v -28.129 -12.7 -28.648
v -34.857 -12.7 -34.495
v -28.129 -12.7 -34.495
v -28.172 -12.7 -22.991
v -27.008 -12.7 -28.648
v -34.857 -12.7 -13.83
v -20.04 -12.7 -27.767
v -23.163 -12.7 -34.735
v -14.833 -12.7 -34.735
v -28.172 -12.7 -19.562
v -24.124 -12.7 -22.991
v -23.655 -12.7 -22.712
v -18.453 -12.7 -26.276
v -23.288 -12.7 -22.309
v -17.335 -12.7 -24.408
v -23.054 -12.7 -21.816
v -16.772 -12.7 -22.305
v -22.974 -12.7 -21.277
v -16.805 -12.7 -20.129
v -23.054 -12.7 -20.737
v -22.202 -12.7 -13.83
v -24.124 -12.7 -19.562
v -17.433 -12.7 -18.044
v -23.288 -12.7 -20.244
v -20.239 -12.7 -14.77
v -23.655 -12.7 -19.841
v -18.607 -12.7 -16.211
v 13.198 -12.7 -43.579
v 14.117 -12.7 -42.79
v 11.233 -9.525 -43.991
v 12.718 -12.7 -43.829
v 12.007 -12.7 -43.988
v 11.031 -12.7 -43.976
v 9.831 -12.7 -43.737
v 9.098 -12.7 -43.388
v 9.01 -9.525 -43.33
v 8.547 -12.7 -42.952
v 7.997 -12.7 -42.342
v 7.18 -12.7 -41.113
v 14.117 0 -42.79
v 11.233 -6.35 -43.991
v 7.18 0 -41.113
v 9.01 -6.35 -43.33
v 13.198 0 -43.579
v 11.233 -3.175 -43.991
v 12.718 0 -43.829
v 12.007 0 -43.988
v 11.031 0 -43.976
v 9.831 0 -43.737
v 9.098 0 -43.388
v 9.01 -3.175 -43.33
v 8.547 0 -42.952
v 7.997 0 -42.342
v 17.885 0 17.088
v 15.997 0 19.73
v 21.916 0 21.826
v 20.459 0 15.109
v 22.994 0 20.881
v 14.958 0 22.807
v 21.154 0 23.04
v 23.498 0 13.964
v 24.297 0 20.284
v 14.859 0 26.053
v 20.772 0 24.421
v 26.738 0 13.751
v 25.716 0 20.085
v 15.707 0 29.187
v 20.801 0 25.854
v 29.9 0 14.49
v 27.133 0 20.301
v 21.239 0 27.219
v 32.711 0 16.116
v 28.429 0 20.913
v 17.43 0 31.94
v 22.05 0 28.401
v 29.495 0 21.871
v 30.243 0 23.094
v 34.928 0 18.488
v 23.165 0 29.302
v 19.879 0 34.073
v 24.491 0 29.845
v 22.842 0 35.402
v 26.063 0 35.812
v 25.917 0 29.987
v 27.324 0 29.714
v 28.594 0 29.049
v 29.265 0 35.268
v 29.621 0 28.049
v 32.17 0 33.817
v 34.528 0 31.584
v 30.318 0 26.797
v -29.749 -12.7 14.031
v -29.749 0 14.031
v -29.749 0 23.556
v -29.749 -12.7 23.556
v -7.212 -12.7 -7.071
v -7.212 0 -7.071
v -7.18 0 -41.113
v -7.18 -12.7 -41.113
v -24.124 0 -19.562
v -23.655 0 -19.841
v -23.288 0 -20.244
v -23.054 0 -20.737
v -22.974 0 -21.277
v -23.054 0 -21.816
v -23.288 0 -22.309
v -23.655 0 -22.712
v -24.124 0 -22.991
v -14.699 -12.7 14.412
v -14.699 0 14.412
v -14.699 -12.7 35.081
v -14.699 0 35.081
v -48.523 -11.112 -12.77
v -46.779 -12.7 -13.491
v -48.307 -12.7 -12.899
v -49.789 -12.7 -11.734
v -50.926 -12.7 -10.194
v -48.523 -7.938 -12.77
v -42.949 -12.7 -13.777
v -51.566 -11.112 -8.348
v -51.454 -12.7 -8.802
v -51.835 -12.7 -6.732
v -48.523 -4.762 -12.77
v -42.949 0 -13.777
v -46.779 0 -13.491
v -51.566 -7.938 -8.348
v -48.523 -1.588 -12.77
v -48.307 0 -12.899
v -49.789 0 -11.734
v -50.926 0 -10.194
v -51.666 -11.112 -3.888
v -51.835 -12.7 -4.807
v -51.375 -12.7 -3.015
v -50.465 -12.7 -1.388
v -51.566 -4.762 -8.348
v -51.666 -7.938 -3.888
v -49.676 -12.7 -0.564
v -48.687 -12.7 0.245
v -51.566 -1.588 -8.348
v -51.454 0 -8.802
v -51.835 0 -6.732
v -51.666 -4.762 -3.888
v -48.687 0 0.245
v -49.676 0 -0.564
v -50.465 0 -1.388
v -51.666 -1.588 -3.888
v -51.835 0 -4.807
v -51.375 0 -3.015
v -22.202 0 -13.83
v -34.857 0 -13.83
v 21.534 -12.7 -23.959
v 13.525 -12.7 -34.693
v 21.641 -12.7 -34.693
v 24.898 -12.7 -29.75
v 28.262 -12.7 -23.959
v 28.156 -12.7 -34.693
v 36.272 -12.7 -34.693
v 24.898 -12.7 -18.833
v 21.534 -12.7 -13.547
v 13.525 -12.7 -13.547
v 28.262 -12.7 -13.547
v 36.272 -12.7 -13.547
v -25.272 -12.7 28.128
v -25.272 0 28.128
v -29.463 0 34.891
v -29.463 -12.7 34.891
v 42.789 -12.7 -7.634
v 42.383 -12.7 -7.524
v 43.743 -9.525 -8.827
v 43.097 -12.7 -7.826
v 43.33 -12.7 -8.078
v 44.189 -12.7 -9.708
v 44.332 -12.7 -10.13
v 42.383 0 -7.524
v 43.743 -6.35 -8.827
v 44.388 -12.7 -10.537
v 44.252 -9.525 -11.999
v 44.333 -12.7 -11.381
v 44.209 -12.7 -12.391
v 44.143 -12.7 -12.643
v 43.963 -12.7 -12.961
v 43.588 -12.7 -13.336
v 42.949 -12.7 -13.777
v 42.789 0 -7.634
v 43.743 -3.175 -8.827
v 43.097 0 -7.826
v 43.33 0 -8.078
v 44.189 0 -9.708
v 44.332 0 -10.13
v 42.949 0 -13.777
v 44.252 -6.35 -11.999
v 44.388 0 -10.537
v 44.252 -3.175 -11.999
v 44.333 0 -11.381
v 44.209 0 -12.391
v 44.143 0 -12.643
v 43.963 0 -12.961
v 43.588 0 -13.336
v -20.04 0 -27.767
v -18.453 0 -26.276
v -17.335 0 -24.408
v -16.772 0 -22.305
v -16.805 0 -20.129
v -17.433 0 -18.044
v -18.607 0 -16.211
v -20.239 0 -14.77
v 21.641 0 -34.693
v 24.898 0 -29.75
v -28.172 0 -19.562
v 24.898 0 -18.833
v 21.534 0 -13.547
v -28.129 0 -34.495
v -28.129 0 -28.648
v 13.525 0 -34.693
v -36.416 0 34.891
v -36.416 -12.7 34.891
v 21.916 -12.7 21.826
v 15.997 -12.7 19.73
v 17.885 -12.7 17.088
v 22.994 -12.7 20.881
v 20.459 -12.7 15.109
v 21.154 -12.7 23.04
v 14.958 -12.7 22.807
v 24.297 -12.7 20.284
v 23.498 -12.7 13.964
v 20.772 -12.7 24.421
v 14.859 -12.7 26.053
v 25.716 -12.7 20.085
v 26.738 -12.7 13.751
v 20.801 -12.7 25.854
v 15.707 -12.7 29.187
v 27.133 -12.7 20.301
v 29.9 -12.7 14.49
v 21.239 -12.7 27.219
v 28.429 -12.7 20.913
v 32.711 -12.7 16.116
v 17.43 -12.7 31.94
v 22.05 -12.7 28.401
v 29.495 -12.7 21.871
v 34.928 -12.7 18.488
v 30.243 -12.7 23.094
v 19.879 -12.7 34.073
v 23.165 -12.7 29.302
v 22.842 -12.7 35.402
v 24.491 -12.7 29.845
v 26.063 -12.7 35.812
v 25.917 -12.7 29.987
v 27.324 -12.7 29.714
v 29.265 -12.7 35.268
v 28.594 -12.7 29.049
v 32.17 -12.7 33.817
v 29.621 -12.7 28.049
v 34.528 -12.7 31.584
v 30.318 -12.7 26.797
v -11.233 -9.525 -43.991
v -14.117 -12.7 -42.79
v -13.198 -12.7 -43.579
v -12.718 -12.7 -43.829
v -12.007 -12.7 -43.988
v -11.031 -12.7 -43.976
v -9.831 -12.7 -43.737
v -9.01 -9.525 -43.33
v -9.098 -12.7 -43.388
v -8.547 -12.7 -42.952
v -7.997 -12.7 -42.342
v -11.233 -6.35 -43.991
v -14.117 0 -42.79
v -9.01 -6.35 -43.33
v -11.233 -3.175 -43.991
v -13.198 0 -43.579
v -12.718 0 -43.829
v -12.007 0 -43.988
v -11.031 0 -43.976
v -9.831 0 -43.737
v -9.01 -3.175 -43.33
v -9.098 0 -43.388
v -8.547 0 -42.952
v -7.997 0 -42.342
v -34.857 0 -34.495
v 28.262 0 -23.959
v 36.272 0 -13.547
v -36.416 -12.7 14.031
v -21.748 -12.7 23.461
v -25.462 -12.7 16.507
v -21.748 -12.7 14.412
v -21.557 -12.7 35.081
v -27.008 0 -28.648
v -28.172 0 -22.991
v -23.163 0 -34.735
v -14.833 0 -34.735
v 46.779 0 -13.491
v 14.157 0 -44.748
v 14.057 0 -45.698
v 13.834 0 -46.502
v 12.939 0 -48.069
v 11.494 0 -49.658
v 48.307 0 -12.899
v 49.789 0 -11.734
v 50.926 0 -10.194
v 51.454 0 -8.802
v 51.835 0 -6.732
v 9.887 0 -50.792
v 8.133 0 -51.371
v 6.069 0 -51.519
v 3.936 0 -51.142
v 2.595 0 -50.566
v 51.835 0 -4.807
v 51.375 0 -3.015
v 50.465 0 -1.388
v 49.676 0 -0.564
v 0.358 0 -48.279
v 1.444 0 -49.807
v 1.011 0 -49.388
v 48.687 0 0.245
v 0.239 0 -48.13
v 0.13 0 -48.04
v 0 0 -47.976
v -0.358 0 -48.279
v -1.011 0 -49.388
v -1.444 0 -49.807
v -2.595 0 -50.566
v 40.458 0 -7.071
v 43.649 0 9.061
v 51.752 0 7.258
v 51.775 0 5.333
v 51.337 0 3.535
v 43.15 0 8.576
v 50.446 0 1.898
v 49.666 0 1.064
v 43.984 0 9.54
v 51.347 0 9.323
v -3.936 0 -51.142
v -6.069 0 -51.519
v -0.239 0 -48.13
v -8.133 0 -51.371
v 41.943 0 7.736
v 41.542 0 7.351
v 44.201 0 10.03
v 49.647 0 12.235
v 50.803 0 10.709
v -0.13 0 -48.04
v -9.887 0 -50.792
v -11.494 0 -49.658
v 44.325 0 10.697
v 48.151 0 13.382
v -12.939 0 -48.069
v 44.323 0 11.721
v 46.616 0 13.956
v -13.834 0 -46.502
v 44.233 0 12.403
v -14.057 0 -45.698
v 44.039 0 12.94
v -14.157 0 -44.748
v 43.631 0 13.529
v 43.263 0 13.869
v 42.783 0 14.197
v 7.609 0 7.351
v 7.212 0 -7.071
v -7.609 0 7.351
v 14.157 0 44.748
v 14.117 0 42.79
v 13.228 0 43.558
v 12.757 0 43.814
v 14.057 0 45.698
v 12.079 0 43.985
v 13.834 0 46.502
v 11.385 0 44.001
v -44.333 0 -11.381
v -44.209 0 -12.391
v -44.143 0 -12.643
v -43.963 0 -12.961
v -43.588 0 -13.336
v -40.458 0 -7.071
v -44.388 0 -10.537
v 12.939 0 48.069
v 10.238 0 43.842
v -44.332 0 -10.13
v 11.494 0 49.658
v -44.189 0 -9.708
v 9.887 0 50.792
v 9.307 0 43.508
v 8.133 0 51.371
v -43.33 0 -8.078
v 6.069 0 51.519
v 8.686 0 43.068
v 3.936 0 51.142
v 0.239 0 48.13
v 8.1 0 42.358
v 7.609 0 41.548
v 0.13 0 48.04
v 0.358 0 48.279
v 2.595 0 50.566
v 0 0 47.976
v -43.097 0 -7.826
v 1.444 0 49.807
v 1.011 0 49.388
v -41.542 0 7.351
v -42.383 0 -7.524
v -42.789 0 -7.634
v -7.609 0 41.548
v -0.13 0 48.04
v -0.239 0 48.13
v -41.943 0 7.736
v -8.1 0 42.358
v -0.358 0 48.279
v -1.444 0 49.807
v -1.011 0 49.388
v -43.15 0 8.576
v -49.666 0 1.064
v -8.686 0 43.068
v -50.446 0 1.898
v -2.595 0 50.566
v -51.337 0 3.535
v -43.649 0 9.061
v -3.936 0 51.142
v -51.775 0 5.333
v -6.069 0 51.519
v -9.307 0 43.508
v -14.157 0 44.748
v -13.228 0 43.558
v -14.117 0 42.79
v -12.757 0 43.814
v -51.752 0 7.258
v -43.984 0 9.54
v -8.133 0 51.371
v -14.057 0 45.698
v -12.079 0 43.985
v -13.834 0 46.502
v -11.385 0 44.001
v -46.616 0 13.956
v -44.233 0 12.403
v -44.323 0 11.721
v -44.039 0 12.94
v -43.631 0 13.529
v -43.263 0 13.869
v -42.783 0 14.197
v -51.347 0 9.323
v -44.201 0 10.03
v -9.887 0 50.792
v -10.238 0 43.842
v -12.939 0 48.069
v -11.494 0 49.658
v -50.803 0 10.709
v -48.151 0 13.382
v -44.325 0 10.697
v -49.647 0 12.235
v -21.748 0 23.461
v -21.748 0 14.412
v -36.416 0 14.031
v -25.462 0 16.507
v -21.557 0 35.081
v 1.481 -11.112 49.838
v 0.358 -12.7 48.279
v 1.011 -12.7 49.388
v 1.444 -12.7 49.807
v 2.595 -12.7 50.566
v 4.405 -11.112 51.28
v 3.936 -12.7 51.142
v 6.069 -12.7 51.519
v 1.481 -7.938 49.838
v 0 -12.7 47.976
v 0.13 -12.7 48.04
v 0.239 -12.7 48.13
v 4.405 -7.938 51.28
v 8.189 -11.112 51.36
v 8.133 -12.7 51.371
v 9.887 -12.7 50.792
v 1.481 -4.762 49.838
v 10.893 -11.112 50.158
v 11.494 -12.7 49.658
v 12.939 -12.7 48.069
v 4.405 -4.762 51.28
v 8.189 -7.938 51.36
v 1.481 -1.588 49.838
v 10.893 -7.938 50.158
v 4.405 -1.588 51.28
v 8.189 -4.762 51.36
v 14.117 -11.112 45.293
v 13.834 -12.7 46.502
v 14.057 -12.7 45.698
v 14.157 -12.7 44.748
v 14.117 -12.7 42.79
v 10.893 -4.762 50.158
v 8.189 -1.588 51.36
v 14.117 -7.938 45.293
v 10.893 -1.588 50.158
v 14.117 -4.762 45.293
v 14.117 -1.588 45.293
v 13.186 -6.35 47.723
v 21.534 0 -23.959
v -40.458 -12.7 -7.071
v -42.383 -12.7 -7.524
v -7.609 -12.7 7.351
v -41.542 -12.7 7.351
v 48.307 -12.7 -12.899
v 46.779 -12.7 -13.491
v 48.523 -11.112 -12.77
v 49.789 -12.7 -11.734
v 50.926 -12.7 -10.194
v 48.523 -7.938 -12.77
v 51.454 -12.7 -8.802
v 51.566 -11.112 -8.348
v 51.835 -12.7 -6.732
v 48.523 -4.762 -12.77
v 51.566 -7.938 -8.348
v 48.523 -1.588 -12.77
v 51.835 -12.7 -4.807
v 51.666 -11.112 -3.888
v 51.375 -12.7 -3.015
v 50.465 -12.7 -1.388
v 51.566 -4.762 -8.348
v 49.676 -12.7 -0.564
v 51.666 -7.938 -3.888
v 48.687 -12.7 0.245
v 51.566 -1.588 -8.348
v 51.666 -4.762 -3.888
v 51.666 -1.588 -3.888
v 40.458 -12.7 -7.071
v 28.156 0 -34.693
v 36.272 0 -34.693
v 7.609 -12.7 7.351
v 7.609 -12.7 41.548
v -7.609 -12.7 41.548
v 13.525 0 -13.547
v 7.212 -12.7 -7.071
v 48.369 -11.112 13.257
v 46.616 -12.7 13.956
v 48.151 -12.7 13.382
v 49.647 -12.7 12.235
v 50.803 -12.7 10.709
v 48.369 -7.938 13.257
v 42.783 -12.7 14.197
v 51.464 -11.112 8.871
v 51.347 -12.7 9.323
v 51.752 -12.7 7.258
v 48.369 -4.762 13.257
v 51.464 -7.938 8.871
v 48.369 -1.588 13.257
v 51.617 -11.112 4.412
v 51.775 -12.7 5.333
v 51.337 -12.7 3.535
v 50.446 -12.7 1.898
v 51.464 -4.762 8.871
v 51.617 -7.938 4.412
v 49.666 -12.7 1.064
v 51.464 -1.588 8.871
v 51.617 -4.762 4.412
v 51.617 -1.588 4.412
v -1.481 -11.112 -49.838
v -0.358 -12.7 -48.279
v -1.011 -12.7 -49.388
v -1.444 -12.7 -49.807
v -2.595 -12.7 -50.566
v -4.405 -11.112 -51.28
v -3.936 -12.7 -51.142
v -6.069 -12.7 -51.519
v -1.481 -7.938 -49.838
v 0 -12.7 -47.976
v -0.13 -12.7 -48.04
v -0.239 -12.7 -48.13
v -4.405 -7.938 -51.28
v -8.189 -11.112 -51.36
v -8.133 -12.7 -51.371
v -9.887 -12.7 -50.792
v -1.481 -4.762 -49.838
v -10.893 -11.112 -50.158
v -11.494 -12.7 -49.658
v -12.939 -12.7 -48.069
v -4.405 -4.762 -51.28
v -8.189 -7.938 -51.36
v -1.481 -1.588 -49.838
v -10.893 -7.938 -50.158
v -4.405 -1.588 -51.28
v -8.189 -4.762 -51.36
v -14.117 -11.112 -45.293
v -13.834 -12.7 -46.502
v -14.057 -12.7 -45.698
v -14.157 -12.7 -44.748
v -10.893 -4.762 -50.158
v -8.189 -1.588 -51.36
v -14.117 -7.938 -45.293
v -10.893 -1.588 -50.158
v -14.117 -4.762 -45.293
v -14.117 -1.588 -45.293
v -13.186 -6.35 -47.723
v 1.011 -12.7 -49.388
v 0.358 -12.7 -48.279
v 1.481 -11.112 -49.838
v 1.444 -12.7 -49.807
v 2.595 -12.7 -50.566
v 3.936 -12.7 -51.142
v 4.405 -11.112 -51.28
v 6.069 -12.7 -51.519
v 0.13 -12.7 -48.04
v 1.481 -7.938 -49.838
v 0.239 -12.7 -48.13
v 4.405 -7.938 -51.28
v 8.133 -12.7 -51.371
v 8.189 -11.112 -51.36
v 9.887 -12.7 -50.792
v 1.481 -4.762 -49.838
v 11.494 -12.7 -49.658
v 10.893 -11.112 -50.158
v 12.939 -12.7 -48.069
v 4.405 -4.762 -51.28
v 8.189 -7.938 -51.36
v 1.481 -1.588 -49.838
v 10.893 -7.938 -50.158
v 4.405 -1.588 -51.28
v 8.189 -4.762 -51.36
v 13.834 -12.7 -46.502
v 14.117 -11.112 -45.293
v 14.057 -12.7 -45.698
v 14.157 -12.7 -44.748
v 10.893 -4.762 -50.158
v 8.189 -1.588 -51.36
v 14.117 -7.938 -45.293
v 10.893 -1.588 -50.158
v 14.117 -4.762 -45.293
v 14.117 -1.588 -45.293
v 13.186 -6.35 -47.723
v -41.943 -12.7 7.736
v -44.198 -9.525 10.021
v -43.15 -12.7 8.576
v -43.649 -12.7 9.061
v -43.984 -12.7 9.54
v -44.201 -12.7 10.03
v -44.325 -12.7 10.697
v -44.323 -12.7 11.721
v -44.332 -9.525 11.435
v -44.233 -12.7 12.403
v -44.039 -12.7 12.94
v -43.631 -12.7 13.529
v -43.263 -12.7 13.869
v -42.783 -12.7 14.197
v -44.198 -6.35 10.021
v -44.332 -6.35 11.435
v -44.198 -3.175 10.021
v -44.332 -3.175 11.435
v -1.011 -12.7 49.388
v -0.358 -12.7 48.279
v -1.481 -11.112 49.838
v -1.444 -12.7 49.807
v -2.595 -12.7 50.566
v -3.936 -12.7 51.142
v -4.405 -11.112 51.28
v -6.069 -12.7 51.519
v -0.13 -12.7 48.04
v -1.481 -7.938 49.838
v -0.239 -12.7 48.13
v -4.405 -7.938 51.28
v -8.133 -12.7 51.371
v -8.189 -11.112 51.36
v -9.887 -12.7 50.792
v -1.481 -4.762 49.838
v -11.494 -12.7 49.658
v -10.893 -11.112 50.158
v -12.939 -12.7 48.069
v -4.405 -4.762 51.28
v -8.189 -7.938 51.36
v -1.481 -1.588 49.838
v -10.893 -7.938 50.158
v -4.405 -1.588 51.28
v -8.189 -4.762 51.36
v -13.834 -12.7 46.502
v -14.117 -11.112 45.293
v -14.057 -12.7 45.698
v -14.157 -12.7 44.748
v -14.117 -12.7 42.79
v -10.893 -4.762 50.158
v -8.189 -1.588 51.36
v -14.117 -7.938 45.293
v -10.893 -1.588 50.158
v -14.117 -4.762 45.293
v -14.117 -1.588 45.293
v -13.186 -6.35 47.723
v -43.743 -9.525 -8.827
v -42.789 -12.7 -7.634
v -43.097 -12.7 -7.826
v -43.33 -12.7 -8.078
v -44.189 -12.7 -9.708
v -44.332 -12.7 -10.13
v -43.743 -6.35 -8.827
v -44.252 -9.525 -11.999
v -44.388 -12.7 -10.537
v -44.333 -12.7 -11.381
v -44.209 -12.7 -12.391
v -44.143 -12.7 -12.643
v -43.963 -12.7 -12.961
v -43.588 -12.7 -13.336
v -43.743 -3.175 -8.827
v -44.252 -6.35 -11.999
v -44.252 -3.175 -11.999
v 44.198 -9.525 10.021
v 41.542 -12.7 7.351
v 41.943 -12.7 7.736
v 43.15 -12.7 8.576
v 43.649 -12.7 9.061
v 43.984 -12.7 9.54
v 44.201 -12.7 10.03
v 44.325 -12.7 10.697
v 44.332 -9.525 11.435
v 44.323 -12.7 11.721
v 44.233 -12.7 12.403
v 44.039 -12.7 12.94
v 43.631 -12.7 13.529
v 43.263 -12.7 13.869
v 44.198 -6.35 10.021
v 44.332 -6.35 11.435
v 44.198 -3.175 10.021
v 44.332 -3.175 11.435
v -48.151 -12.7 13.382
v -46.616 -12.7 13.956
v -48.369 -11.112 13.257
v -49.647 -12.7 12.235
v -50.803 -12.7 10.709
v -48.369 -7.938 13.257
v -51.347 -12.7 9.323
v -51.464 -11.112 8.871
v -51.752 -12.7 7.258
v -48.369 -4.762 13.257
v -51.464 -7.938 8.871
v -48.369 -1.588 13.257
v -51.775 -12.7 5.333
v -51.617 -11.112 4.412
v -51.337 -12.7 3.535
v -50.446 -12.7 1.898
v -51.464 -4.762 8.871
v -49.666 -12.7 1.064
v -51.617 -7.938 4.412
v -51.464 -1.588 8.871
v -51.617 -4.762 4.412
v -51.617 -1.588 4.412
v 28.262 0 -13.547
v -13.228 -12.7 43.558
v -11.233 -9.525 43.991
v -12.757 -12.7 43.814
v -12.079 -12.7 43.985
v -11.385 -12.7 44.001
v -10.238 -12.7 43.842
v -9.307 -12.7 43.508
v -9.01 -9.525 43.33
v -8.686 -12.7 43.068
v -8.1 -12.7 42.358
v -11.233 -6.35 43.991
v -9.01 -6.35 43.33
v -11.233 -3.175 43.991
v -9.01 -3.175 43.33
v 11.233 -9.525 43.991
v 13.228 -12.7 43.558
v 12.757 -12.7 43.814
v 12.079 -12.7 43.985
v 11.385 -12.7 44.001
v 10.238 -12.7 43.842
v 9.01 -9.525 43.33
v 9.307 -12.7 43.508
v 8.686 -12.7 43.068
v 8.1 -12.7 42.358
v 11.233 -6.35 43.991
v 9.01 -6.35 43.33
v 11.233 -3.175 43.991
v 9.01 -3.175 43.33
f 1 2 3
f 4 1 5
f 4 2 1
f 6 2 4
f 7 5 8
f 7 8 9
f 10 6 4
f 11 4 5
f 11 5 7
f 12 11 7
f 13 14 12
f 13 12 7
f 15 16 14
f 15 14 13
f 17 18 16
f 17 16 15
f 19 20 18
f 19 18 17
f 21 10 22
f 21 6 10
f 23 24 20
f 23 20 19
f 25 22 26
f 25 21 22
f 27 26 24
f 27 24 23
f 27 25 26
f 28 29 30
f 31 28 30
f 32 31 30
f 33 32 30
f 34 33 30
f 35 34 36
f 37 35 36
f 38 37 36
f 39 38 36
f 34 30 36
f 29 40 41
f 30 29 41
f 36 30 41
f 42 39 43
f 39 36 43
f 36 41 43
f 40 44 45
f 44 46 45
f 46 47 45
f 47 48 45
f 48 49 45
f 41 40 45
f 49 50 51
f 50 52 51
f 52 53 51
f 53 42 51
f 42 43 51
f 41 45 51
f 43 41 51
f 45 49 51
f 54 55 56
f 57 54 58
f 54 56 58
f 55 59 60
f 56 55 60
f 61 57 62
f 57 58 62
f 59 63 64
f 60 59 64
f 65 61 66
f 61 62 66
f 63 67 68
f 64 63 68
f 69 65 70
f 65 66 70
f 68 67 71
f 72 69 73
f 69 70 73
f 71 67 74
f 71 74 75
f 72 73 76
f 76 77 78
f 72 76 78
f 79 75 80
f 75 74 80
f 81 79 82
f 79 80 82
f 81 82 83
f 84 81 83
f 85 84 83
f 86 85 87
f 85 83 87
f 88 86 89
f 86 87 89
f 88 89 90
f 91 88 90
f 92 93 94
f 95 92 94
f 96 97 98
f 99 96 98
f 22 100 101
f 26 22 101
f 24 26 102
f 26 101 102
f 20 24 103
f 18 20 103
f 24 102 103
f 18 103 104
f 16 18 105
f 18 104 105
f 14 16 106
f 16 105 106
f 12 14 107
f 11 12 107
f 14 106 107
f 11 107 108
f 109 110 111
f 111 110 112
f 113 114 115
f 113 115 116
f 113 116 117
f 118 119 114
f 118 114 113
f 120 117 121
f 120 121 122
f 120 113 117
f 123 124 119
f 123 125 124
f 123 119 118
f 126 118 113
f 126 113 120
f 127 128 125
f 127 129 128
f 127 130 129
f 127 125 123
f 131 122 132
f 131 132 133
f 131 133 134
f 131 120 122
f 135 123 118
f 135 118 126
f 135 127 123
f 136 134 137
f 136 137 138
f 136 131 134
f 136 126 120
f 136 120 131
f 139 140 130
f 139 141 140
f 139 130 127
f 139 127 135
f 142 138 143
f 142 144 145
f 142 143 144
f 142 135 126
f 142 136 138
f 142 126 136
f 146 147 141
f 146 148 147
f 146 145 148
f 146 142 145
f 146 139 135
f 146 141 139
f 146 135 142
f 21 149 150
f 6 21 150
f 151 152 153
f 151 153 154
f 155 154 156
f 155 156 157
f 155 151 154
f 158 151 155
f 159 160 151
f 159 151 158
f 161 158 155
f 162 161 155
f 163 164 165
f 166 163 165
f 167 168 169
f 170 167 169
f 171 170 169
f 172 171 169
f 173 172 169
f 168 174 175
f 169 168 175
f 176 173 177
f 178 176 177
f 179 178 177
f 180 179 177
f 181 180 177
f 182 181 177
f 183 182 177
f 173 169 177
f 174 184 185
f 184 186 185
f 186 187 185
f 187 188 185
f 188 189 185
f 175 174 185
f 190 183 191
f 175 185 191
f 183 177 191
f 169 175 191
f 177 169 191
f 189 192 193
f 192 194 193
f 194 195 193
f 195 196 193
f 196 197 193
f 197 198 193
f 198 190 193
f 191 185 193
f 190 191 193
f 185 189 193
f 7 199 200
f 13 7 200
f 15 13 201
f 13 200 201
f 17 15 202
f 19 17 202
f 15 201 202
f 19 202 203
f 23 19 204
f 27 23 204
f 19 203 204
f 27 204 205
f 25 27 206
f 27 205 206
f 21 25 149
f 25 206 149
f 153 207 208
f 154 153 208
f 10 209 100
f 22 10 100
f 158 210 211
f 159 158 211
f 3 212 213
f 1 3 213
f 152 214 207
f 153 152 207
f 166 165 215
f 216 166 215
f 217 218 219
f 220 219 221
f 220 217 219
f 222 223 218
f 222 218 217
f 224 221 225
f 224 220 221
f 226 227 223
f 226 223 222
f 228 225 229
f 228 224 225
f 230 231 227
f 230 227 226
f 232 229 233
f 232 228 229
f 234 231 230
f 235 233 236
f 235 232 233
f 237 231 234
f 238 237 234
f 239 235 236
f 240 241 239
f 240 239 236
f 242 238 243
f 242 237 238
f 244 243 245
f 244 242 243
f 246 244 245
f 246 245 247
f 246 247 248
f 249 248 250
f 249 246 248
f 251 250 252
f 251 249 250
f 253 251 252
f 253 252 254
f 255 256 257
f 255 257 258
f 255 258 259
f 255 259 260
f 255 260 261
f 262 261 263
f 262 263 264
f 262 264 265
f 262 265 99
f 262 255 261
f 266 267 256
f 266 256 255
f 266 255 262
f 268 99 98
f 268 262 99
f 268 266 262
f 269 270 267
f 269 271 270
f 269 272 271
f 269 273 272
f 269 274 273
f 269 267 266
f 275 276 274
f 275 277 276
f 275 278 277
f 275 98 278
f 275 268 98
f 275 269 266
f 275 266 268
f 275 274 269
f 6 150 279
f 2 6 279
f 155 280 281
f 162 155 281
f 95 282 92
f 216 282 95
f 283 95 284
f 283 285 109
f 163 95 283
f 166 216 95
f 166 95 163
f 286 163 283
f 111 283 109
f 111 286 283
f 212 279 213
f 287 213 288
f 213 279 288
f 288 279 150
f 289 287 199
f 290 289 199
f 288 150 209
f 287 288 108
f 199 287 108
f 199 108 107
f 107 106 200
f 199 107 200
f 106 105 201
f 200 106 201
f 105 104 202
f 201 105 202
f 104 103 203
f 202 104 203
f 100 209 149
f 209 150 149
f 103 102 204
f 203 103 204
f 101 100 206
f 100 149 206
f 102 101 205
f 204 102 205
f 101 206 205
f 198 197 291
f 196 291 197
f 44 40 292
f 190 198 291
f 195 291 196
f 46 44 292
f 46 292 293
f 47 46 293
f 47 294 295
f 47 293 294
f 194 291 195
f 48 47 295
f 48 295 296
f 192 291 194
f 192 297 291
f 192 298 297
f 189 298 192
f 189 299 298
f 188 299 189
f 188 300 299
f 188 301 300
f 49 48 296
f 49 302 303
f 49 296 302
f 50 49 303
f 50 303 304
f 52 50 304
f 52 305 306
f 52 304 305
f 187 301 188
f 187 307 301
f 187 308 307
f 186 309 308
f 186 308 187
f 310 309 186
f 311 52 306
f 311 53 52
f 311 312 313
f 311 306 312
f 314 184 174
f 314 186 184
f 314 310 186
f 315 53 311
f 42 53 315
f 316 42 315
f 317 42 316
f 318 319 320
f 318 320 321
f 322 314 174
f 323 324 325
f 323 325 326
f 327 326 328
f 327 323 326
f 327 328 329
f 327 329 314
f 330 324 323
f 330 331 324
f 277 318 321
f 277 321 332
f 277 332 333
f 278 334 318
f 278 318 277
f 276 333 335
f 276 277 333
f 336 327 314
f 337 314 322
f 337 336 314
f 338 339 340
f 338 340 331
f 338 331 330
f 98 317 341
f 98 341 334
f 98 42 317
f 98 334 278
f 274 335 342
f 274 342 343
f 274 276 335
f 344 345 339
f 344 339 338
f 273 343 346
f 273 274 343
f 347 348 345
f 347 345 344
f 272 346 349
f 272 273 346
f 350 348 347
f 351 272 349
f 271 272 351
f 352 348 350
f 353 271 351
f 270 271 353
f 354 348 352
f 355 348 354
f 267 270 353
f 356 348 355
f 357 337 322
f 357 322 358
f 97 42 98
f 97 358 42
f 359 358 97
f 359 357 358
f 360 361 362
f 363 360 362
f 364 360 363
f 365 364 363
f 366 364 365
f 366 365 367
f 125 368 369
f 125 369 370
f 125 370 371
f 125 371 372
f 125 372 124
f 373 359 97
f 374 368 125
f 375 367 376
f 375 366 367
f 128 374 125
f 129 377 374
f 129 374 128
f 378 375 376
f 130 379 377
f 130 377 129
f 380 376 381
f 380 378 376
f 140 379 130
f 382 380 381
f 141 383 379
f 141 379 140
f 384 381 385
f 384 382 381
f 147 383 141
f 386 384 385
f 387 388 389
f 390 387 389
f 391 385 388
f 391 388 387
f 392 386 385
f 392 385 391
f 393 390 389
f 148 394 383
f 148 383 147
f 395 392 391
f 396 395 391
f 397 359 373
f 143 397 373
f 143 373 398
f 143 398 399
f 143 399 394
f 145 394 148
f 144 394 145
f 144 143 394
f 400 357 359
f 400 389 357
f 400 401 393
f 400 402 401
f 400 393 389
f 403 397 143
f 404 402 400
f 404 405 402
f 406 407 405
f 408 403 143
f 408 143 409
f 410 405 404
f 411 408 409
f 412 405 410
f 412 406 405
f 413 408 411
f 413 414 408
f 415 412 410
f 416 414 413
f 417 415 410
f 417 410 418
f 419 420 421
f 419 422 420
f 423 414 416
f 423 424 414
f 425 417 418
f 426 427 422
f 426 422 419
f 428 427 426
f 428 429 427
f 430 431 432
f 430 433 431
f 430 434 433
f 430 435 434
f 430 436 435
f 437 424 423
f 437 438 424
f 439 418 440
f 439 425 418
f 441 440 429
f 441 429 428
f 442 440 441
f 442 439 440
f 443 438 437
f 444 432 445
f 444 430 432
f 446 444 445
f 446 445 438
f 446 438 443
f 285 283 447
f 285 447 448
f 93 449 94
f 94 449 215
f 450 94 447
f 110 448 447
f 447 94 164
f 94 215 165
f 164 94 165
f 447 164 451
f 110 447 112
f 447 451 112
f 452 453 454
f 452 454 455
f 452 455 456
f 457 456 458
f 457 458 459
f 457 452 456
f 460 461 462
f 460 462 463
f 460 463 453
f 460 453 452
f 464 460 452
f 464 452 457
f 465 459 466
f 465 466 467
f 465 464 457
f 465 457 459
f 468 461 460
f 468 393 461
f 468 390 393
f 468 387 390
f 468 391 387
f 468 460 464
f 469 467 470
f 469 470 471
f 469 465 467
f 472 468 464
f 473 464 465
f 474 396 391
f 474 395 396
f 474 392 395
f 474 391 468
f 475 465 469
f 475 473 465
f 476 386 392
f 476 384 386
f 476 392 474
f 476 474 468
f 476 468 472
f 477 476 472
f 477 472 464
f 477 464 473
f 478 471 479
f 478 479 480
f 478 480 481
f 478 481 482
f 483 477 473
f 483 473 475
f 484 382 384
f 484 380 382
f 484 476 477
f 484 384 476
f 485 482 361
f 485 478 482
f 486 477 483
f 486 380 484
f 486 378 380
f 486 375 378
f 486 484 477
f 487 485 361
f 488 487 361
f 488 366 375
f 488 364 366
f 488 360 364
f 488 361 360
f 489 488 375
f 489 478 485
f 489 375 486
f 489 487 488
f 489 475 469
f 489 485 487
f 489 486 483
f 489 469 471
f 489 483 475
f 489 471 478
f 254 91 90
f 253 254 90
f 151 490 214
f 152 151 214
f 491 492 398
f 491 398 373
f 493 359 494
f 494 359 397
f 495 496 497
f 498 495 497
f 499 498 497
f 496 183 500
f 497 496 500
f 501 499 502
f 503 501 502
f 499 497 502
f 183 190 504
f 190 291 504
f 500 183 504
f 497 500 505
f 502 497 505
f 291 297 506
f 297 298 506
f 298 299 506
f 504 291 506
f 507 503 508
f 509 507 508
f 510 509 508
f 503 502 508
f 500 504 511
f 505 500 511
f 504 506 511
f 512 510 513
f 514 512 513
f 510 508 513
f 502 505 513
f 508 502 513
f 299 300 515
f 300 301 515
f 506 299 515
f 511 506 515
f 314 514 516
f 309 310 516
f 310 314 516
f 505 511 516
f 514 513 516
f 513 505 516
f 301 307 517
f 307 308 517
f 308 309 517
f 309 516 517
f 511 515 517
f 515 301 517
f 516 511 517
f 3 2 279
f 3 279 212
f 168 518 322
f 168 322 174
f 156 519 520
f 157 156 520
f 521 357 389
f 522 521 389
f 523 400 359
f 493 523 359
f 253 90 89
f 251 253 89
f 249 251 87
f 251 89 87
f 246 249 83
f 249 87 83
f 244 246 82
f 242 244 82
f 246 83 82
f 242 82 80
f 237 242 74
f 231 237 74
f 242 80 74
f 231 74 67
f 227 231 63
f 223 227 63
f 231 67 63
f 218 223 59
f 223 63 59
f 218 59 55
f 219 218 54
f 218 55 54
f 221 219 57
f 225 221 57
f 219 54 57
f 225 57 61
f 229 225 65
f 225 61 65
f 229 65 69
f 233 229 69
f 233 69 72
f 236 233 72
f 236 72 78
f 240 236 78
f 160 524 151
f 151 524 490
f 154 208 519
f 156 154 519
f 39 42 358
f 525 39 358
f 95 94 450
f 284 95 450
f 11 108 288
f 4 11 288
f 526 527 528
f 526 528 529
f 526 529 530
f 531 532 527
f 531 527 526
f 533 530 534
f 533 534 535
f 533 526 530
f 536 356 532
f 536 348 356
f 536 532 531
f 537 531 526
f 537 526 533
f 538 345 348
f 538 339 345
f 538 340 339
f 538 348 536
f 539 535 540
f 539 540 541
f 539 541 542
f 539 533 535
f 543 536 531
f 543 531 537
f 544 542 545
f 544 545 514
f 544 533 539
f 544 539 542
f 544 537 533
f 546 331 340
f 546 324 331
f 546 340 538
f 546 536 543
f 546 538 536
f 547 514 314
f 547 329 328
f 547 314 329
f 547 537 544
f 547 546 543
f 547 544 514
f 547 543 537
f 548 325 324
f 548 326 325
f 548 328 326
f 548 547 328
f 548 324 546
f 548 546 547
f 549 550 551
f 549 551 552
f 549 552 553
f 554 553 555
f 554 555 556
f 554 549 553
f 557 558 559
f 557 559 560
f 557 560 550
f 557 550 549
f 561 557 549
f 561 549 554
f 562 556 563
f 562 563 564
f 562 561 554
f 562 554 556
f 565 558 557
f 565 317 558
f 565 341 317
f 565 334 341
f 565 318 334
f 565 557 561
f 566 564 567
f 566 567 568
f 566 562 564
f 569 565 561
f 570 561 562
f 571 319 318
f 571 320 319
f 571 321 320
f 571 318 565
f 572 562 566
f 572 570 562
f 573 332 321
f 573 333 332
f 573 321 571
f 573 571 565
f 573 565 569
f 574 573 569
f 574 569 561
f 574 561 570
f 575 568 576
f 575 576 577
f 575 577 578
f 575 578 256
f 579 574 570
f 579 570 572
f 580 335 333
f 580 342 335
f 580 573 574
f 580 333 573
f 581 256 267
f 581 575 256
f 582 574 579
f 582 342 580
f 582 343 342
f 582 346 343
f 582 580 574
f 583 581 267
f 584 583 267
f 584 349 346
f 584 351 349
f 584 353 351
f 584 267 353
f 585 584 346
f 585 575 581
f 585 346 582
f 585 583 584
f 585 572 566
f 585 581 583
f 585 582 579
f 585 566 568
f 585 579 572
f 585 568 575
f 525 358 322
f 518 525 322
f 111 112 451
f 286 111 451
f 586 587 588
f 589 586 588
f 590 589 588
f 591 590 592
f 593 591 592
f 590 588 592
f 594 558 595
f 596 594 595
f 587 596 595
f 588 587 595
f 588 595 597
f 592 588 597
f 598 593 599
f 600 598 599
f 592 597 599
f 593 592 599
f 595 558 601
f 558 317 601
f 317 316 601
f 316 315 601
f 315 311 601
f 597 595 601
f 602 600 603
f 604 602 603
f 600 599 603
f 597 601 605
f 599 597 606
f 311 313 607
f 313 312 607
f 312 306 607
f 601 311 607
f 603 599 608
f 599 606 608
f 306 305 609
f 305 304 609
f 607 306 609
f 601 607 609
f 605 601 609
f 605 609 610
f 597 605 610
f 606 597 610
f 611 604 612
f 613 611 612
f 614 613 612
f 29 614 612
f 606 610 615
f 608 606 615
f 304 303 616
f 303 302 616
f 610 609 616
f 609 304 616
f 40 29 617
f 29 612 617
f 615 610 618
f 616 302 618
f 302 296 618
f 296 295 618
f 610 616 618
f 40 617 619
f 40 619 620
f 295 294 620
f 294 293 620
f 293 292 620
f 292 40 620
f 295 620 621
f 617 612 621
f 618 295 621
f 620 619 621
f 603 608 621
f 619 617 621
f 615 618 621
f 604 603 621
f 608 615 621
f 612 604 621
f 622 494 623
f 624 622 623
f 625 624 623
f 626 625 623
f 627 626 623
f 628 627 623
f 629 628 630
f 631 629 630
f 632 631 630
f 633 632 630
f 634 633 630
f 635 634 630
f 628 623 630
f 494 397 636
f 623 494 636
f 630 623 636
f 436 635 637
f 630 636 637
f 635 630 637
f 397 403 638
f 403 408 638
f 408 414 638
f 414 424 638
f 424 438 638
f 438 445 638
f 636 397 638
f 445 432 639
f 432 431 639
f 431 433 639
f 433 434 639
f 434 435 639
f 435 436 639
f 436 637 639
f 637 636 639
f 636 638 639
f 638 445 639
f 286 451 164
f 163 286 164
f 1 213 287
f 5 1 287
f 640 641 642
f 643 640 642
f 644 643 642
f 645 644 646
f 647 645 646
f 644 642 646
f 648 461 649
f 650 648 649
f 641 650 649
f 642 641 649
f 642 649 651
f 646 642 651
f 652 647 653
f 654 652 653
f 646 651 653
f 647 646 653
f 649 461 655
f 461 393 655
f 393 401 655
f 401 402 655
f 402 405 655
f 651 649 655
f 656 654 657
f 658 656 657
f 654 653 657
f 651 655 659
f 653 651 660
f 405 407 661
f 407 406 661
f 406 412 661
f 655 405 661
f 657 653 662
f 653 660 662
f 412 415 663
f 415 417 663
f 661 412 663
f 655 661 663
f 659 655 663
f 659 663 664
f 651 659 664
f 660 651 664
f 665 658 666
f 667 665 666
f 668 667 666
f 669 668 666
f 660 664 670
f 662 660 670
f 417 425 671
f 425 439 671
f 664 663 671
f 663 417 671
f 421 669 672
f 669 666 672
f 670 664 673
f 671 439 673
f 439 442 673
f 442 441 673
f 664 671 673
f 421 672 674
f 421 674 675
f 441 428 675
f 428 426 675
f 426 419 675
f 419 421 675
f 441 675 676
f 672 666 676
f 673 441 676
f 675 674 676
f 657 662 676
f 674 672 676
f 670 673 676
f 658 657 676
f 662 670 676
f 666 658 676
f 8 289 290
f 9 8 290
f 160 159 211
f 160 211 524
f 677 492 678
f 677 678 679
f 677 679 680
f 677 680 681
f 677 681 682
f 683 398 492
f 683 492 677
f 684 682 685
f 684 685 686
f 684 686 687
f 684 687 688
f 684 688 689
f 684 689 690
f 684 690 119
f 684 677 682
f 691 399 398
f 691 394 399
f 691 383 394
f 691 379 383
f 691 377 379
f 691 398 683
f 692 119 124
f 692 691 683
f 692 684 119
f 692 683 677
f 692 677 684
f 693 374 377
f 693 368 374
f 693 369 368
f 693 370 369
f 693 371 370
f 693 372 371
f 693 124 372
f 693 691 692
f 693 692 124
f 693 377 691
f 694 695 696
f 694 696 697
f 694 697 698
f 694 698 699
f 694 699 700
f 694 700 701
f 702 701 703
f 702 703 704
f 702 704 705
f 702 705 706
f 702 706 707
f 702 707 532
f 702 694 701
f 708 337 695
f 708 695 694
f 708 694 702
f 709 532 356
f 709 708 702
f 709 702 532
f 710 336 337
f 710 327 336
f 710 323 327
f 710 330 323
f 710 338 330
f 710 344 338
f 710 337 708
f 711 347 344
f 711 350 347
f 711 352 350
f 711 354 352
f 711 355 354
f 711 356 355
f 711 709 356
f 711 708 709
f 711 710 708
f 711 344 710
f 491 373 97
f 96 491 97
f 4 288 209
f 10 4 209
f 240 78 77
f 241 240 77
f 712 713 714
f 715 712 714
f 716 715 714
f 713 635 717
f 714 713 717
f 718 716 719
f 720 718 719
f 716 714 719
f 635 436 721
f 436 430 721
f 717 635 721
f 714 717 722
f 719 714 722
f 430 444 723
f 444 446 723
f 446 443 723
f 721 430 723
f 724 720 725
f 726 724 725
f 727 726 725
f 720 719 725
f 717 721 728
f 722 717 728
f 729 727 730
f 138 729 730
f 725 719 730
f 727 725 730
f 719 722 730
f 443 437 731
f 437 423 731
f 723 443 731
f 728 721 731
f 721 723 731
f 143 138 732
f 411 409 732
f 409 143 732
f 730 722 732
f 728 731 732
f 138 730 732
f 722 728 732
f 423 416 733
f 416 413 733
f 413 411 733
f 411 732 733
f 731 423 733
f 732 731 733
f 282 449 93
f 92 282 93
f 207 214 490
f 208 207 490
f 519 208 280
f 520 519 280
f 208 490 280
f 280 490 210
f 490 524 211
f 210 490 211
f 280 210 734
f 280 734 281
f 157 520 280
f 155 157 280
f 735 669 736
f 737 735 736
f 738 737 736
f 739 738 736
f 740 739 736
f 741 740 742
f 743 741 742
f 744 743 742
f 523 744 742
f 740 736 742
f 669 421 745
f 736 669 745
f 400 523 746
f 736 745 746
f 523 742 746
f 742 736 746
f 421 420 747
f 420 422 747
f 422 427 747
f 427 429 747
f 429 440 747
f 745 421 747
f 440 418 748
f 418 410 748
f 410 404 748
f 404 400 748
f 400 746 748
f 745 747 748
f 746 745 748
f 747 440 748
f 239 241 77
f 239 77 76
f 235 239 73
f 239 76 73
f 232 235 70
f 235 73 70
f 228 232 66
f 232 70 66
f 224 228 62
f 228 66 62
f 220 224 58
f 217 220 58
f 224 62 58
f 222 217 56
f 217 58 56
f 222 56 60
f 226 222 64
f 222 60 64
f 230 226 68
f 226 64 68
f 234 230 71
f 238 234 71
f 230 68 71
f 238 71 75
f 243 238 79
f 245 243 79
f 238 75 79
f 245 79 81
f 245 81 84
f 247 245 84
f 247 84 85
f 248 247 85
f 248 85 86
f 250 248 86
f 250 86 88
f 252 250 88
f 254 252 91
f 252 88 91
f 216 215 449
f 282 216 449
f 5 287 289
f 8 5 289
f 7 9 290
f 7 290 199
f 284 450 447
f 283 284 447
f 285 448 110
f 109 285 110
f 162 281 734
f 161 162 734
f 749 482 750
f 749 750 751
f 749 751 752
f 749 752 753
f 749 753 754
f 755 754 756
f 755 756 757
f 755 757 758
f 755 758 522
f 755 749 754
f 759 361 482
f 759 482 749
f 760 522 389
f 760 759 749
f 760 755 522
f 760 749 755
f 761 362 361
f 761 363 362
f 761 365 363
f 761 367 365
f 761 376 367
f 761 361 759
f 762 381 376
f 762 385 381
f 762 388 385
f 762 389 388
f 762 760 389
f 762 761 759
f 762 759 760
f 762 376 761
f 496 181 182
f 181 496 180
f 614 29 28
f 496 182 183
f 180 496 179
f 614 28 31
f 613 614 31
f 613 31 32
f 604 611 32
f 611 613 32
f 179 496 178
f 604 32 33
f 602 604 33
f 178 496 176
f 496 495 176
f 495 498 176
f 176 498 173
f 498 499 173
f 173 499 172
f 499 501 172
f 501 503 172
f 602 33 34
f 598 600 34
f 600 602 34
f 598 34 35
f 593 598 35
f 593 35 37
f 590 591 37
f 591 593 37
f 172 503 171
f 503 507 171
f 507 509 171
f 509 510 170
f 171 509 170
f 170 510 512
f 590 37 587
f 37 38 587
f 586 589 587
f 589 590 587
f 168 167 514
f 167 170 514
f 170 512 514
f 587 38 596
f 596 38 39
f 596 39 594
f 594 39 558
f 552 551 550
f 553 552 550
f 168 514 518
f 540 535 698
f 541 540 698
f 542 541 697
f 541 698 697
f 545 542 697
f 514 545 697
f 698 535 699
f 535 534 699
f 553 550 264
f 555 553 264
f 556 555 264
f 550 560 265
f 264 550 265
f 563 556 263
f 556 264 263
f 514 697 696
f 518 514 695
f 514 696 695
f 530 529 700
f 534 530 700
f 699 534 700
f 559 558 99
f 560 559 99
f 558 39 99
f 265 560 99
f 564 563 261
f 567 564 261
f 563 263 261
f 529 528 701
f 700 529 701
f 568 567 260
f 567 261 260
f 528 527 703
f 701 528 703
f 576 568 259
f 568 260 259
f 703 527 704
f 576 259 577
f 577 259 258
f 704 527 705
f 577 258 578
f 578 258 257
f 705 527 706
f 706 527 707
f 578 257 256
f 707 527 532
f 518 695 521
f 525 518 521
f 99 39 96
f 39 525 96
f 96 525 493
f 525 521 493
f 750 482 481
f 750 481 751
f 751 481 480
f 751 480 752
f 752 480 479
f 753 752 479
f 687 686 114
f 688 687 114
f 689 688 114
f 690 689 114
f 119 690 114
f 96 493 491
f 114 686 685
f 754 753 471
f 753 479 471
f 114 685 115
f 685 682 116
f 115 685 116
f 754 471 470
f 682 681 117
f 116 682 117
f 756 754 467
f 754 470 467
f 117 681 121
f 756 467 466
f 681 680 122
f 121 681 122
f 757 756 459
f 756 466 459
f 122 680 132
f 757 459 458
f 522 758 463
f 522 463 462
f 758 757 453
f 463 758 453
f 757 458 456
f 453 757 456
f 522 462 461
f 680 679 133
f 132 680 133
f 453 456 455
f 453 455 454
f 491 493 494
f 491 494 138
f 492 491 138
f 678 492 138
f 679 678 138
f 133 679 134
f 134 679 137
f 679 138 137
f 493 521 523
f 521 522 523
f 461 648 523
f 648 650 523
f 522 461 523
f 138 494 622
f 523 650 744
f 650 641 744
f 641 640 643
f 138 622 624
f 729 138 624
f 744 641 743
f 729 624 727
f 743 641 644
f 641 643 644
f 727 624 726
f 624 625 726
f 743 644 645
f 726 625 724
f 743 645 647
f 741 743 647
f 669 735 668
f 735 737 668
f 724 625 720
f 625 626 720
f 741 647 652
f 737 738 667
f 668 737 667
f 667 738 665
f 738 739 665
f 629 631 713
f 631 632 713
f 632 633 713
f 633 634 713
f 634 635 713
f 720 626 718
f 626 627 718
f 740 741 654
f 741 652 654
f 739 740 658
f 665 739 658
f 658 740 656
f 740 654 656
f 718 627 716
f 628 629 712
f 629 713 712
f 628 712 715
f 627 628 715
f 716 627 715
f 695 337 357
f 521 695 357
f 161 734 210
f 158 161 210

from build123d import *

# Parameters (mm, degrees)
F1_DEPTH = 12.7


with BuildPart() as f1:
    # F0 (on Front) → F1 (new body)
    with BuildSketch(Plane.XZ):
        with BuildLine():
            add(Edge.make_bspline(
                [(0, 47.9758307338), (0.3401024151, 48.0959750712), (0.5908872818, 48.8948944755), (1.44218376, 49.9876306749), (4.4001276789, 51.6259487784), (8.2552308539, 51.5648948682), (10.9805142821, 50.4049571137), (13.5788147215, 47.4974493331), (14.2450998496, 45.3407836728), (14.1595642706, 43.6447338682), (14.1165088862, 42.7896566689)],
                knots=[0, 0, 0, 0, 0.0801812271, 0.172057163, 0.3147621593, 0.4685447635, 0.6044907338, 0.7571112766, 0.8749503565, 1, 1, 1, 1], degree=3))
            add(Edge.make_bspline(
                [(0, 47.9758307338), (-0.3401024151, 48.0959750712), (-0.5908872818, 48.8948944755), (-1.44218376, 49.9876306749), (-4.4001276789, 51.6259487784), (-8.2552308539, 51.5648948682), (-10.9805142821, 50.4049571137), (-13.5788147215, 47.4974493331), (-14.2450998496, 45.3407836728), (-14.1595642706, 43.6447338682), (-14.1165088862, 42.7896566689)],
                knots=[0, 0, 0, 0, 0.0801812271, 0.172057163, 0.3147621593, 0.4685447635, 0.6044907338, 0.7571112766, 0.8749503565, 1, 1, 1, 1], degree=3))
            add(Edge.make_bspline(
                [(-14.1165088862, 42.7896566689), (-13.779611525, 43.1393699296), (-12.8848726229, 43.9590002877), (-11.22657774, 44.0831806062), (-8.7857116767, 43.59035932), (-7.9967096529, 42.2229408011), (-7.6087587513, 41.5481775999)],
                knots=[0, 0, 0, 0, 0.2268776036, 0.4564837499, 0.7297676246, 1, 1, 1, 1], degree=3))
            Line((-7.6087587513, 41.5481775999), (-7.6087587513, 7.3510748334))
            Line((-7.6087587513, 7.3510748334), (-41.5422581136, 7.3510748334))
            add(Edge.make_bspline(
                [(-41.5422581136, 7.3510748334), (-41.85871066, 7.7855279455), (-43.3326510803, 8.4773645882), (-44.3411915552, 9.9886784509), (-44.3468502966, 11.5297361742), (-44.26490888, 13.3210495114), (-42.7831672132, 14.1966249794)],
                knots=[0, 0, 0, 0, 0.2511238804, 0.4812791978, 0.6893650186, 1, 1, 1, 1], degree=3))
            add(Edge.make_bspline(
                [(-42.7831672132, 14.1966249794), (-44.8378655371, 14.151957489), (-45.953565777, 14.1851800521), (-48.5237910858, 13.4492529595), (-50.8237138562, 11.1351611219), (-51.4978303258, 8.8922821856), (-51.8451627528, 6.9745507828), (-51.8381564377, 4.3771847358), (-50.4632850026, 1.5954941268), (-49.4031041048, 0.8513253508), (-48.686676454, 0.2445175072)],
                knots=[0, 0, 0, 0, 0.1446545297, 0.2615101849, 0.4002938068, 0.5179689459, 0.6252866322, 0.7501602024, 0.8824081053, 1, 1, 1, 1], degree=3))
            add(Edge.make_bspline(
                [(-42.9489933071, -13.7765992949), (-45.0030176638, -13.707575176), (-46.1190333665, -13.7275680615), (-48.6803531502, -12.9612210191), (-50.9526792361, -10.6200247562), (-51.6001575586, -8.3693113672), (-51.9247296379, -6.4475968948), (-51.8869303731, -3.8504964566), (-50.4791768367, -1.0853013301), (-49.4102478504, -0.3537539798), (-48.686676454, 0.2445175072)],
                knots=[0, 0, 0, 0, 0.1446545297, 0.2615101849, 0.4002938068, 0.5179689459, 0.6252866322, 0.7501602024, 0.8824081053, 1, 1, 1, 1], degree=3))
            add(Edge.make_bspline(
                [(-42.3833914101, -7.5243525207), (-43.2329326868, -7.6376241632), (-43.68260861, -8.8625946484), (-44.5849794631, -10.2212402763), (-44.1445660433, -12.2195480003), (-44.2449684371, -12.9899177976), (-42.9489933071, -13.7765992949)],
                knots=[0, 0, 0, 0, 0.2528621237, 0.4858898495, 0.7263732951, 1, 1, 1, 1], degree=3))
            Line((-42.3833914101, -7.5243525207), (-40.4577702284, -7.0712645538))
            Line((-40.4577702284, -7.0712645538), (-7.2124442086, -7.0712645538))
            Line((-7.2124442086, -7.0712645538), (-7.1800267324, -41.1133728921))
            add(Edge.make_bspline(
                [(-14.1165088862, -42.7896566689), (-13.7907092981, -43.1278499866), (-12.8865917267, -43.9689797849), (-11.20181489, -44.0637767903), (-8.8025796941, -43.6526060389), (-7.6024890047, -41.8481617381), (-7.1800267324, -41.1133728921)],
                knots=[0, 0, 0, 0, 0.2194040035, 0.4414466684, 0.7057282689, 1, 1, 1, 1], degree=3))
            add(Edge.make_bspline(
                [(0, -47.9758307338), (-0.3401024151, -48.0959750712), (-0.5908872818, -48.8948944755), (-1.44218376, -49.9876306749), (-4.4001276789, -51.6259487784), (-8.2552308539, -51.5648948682), (-10.9805142821, -50.4049571137), (-13.5788147215, -47.4974493331), (-14.2450998496, -45.3407836728), (-14.1595642706, -43.6447338682), (-14.1165088862, -42.7896566689)],
                knots=[0, 0, 0, 0, 0.0801812271, 0.172057163, 0.3147621593, 0.4685447635, 0.6044907338, 0.7571112766, 0.8749503565, 1, 1, 1, 1], degree=3))
            add(Edge.make_bspline(
                [(0, -47.9758307338), (0.3401024151, -48.0959750712), (0.5908872818, -48.8948944755), (1.44218376, -49.9876306749), (4.4001276789, -51.6259487784), (8.2552308539, -51.5648948682), (10.9805142821, -50.4049571137), (13.5788147215, -47.4974493331), (14.2450998496, -45.3407836728), (14.1595642706, -43.6447338682), (14.1165088862, -42.7896566689)],
                knots=[0, 0, 0, 0, 0.0801812271, 0.172057163, 0.3147621593, 0.4685447635, 0.6044907338, 0.7571112766, 0.8749503565, 1, 1, 1, 1], degree=3))
            add(Edge.make_bspline(
                [(14.1165088862, -42.7896566689), (13.7907092981, -43.1278499866), (12.8865917267, -43.9689797849), (11.20181489, -44.0637767903), (8.8025796941, -43.6526060389), (7.6024890047, -41.8481617381), (7.1800267324, -41.1133728921)],
                knots=[0, 0, 0, 0, 0.2194040035, 0.4414466684, 0.7057282689, 1, 1, 1, 1], degree=3))
            Line((7.1800267324, -41.1133728921), (7.2124442086, -7.0712645538))
            Line((7.2124442086, -7.0712645538), (40.4577702284, -7.0712645538))
            Line((40.4577702284, -7.0712645538), (42.3833914101, -7.5243525207))
            add(Edge.make_bspline(
                [(42.3833914101, -7.5243525207), (43.2329326868, -7.6376241632), (43.68260861, -8.8625946484), (44.5849794631, -10.2212402763), (44.1445660433, -12.2195480003), (44.2449684371, -12.9899177976), (42.9489933071, -13.7765992949)],
                knots=[0, 0, 0, 0, 0.2528621237, 0.4858898495, 0.7263732951, 1, 1, 1, 1], degree=3))
            add(Edge.make_bspline(
                [(42.9489933071, -13.7765992949), (45.0030176638, -13.707575176), (46.1190333665, -13.7275680615), (48.6803531502, -12.9612210191), (50.9526792361, -10.6200247562), (51.6001575586, -8.3693113672), (51.9247296379, -6.4475968948), (51.8869303731, -3.8504964566), (50.4791768367, -1.0853013301), (49.4102478504, -0.3537539798), (48.686676454, 0.2445175072)],
                knots=[0, 0, 0, 0, 0.1446545297, 0.2615101849, 0.4002938068, 0.5179689459, 0.6252866322, 0.7501602024, 0.8824081053, 1, 1, 1, 1], degree=3))
            add(Edge.make_bspline(
                [(42.7831672132, 14.1966249794), (44.8378655371, 14.151957489), (45.953565777, 14.1851800521), (48.5237910858, 13.4492529595), (50.8237138562, 11.1351611219), (51.4978303258, 8.8922821856), (51.8451627528, 6.9745507828), (51.8381564377, 4.3771847358), (50.4632850026, 1.5954941268), (49.4031041048, 0.8513253508), (48.686676454, 0.2445175072)],
                knots=[0, 0, 0, 0, 0.1446545297, 0.2615101849, 0.4002938068, 0.5179689459, 0.6252866322, 0.7501602024, 0.8824081053, 1, 1, 1, 1], degree=3))
            add(Edge.make_bspline(
                [(41.5422581136, 7.3510748334), (41.85871066, 7.7855279455), (43.3326510803, 8.4773645882), (44.3411915552, 9.9886784509), (44.3468502966, 11.5297361742), (44.26490888, 13.3210495114), (42.7831672132, 14.1966249794)],
                knots=[0, 0, 0, 0, 0.2511238804, 0.4812791978, 0.6893650186, 1, 1, 1, 1], degree=3))
            Line((41.5422581136, 7.3510748334), (7.6087587513, 7.3510748334))
            Line((7.6087587513, 7.3510748334), (7.6087587513, 41.5481775999))
            add(Edge.make_bspline(
                [(14.1165088862, 42.7896566689), (13.779611525, 43.1393699296), (12.8848726229, 43.9590002877), (11.22657774, 44.0831806062), (8.7857116767, 43.59035932), (7.9967096529, 42.2229408011), (7.6087587513, 41.5481775999)],
                knots=[0, 0, 0, 0, 0.2268776036, 0.4564837499, 0.7297676246, 1, 1, 1, 1], degree=3))
        make_face()
    extrude(amount=F1_DEPTH)


with BuildPart() as f1b:
    # F0 (on Front) → F1, piece 2 (new body)
    with BuildSketch(Plane.XZ):
        Polygon((-36.4160165191, 34.8906926811), (-36.4160165191, 14.0309426934), (-29.7485142946, 14.0309426934), (-29.7485142946, 23.5559418797), (-25.4622641951, 16.5074430406), (-21.7475146055, 23.4606936574), (-21.7475146055, 14.411942102), (-14.6990148351, 14.411942102), (-14.6990148351, 35.0811928511), (-21.5570144355, 35.0811928511), (-25.2717640251, 28.1279440969), (-29.4627640396, 34.8906926811), align=None)
    extrude(amount=F1_DEPTH)


with BuildPart() as f1c:
    # F0 (on Front) → F1, piece 3 (new body)
    with BuildSketch(Plane.XZ):
        with BuildLine():
            ThreePointArc((30.2428174764, 23.0938643217), (20.7344560339, 25.1389158188), (30.3179193288, 26.796746999))
            Line((30.3179193288, 26.796746999), (34.5279201865, 31.5839760005))
            ThreePointArc((34.5279201865, 31.5839760005), (14.7885733906, 24.4264055918), (34.9283963442, 18.4883791953))
            Line((34.9283963442, 18.4883791953), (30.2428174764, 23.0938643217))
        make_face()
    extrude(amount=F1_DEPTH)


with BuildPart() as f1d:
    # F0 (on Front) → F1, piece 4 (new body)
    with BuildSketch(Plane.XZ):
        with BuildLine():
            Line((-34.8571650684, -13.8301076367), (-34.8571650684, -34.4947166741))
            Line((-34.8571650684, -34.4947166741), (-28.1291529536, -34.4947166741))
            Line((-28.1291529536, -34.4947166741), (-28.1291529536, -28.6477524787))
            Line((-28.1291529536, -28.6477524787), (-27.007818222, -28.6477524787))
            Line((-27.007818222, -28.6477524787), (-23.1632404029, -34.7350016236))
            Line((-23.1632404029, -34.7350016236), (-14.8333199322, -34.7350016236))
            Line((-14.8333199322, -34.7350016236), (-20.0395192951, -27.7667045593))
            ThreePointArc((-20.0395192951, -27.7667045593), (-16.8049195171, -20.128699291), (-22.2020950168, -13.8301076367))
            Line((-22.2020950168, -13.8301076367), (-34.8571650684, -13.8301076367))
        make_face()
        with BuildLine():
            ThreePointArc((-24.1236910224, -19.5620302111), (-22.9737007691, -21.2765298784), (-24.1236910224, -22.9910295457))
            Line((-24.1236910224, -22.9910295457), (-28.1718168408, -22.9910295457))
            Line((-28.1718168408, -22.9910295457), (-28.1718168408, -19.5620302111))
            Line((-28.1718168408, -19.5620302111), (-24.1236910224, -19.5620302111))
        make_face(mode=Mode.SUBTRACT)
    extrude(amount=F1_DEPTH)


with BuildPart() as f1e:
    # F0 (on Front) → F1, piece 5 (new body)
    with BuildSketch(Plane.XZ):
        Polygon((24.8982962221, -18.8329517841), (21.5342920274, -13.5466558859), (13.5247530416, -13.5466558859), (21.5342920274, -23.9590555429), (13.5247530416, -34.6934868201), (21.6406163191, -34.6934868201), (24.8982962221, -29.7497363654), (28.1559761251, -34.6934868201), (36.2718394026, -34.6934868201), (28.2623004168, -23.9590555429), (36.2718394026, -13.5466558859), (28.2623004168, -13.5466558859), align=None)
    extrude(amount=F1_DEPTH)


solid = Compound([f1.part, f1b.part, f1c.part, f1d.part, f1e.part])
